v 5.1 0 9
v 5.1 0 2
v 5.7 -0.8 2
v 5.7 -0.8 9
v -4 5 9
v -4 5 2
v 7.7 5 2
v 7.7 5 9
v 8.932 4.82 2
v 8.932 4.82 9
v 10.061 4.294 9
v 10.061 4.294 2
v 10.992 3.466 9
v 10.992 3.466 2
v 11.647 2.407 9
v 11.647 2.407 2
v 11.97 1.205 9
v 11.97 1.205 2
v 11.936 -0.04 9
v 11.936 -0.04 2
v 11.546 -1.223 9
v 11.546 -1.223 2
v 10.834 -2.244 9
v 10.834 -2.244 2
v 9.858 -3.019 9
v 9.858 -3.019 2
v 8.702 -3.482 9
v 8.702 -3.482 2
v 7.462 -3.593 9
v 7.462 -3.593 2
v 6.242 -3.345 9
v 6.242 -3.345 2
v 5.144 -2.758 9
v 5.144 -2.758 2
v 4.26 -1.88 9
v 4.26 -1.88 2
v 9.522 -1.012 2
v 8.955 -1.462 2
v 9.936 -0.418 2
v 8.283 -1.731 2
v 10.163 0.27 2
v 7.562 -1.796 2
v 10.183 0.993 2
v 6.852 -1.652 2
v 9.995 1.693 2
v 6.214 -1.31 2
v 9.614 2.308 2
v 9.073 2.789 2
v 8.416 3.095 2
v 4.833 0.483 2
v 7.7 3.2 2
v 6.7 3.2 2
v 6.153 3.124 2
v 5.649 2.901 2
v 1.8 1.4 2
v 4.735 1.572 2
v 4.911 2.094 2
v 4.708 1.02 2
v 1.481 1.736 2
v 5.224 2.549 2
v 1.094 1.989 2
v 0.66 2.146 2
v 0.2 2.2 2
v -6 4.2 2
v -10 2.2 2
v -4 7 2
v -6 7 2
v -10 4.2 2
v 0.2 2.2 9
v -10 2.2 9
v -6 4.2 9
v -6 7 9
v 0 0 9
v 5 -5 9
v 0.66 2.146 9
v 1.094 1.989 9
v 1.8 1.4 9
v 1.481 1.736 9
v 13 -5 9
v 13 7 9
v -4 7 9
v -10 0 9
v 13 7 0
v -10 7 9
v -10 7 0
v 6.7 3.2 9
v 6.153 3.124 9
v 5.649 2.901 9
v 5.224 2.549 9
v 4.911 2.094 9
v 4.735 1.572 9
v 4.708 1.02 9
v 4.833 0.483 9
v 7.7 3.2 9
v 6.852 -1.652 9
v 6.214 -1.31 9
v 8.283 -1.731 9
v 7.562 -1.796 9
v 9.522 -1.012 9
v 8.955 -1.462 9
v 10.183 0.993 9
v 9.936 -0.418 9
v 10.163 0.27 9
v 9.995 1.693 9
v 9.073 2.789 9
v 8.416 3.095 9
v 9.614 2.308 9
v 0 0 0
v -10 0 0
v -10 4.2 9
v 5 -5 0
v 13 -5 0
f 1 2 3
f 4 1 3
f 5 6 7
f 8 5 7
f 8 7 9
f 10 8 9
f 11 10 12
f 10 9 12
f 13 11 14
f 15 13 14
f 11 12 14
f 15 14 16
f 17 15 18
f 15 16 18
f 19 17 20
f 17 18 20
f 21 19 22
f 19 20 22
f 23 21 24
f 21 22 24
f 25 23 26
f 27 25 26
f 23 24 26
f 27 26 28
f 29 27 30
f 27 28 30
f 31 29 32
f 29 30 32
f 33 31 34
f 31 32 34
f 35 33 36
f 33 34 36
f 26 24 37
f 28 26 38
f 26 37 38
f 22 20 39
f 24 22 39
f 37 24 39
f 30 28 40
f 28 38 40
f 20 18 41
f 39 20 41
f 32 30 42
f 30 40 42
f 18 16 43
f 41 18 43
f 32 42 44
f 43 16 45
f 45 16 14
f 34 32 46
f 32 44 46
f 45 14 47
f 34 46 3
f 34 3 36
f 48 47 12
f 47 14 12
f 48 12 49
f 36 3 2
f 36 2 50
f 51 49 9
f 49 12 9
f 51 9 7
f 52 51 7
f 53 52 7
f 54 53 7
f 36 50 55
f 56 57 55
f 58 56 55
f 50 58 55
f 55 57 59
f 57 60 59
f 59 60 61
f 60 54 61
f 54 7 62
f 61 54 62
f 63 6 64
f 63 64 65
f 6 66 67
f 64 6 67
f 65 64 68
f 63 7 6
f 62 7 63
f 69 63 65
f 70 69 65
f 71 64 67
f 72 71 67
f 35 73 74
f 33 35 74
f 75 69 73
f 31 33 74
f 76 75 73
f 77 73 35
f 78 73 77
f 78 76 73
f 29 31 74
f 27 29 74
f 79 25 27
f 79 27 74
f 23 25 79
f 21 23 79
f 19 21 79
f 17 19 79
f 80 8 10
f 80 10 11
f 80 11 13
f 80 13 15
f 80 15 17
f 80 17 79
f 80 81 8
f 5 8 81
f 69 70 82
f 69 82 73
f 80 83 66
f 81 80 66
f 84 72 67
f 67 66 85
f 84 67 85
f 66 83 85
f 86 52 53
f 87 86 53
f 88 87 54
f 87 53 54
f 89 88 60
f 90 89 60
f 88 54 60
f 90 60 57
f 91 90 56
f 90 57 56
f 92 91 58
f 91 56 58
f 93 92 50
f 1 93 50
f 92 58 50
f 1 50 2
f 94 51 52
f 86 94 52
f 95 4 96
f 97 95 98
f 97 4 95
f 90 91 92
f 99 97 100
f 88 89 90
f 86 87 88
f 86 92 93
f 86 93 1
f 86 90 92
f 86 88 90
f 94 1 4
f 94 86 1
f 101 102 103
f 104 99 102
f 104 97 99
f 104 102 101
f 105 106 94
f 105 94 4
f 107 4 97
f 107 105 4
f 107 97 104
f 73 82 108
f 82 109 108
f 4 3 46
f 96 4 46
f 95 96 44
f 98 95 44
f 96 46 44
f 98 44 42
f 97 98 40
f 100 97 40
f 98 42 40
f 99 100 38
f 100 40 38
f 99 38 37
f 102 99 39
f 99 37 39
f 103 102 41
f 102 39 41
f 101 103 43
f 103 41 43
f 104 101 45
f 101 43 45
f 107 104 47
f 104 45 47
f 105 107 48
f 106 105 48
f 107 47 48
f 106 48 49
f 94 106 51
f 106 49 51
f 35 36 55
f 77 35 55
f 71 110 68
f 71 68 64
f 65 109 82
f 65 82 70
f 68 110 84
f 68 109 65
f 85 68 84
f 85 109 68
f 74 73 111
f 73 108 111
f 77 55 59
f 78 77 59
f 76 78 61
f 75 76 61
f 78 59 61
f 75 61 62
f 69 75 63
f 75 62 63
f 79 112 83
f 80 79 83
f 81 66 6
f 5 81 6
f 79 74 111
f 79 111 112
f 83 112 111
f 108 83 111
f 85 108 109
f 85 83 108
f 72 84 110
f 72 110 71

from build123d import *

# Parameters (mm, degrees)
RESSALTO_EXTRUS_O1_DEPTH = 2
ESBO_O2_W                = 4
ESBO_O2_H                = 2.8
RESSALTO_EXTRUS_O2_DEPTH = 7


with BuildPart() as part:
    # Esboço1 → Ressalto-extrusão1 (new body)
    with BuildSketch(Plane.XY):
        Polygon((-10, 0), (-10, 7), (13, 7), (13, -5), (5, -5), (0, 0), align=None)
    extrude(amount=RESSALTO_EXTRUS_O1_DEPTH)

    # Esboço2 → Ressalto-extrusão2 (add)
    with BuildSketch(Plane.XY.offset(2)):
        with BuildLine():
            Line((13, 7), (-4, 7))
            Line((-4, 7), (-4, 5))
            Line((-4, 5), (7.7, 5))
            ThreePointArc((7.7, 5), (11.546036921, -1.223018461), (4.26, -1.88))
            Line((4.26, -1.88), (1.8, 1.4))
            ThreePointArc((1.8, 1.4), (1.094427191, 1.988854382), (0.2, 2.2))
            Line((0.2, 2.2), (-10, 2.2))
            Line((-10, 2.2), (-10, 0))
            Line((-10, 0), (0, 0))
            Line((0, 0), (5, -5))
            Line((5, -5), (13, -5))
            Line((13, -5), (13, 7))
        make_face()
        with Locations((-8, 5.6)):
            Rectangle(ESBO_O2_W, ESBO_O2_H)
        with BuildLine():
            Line((7.7, 3.2), (6.7, 3.2))
            ThreePointArc((6.7, 3.2), (4.911145618, 2.094427191), (5.1, 0))
            Line((5.1, 0), (5.7, -0.8))
            ThreePointArc((5.7, -0.8), (9.936067977, -0.418033989), (7.7, 3.2))
        make_face()
    extrude(amount=RESSALTO_EXTRUS_O2_DEPTH)


solid = part.part
